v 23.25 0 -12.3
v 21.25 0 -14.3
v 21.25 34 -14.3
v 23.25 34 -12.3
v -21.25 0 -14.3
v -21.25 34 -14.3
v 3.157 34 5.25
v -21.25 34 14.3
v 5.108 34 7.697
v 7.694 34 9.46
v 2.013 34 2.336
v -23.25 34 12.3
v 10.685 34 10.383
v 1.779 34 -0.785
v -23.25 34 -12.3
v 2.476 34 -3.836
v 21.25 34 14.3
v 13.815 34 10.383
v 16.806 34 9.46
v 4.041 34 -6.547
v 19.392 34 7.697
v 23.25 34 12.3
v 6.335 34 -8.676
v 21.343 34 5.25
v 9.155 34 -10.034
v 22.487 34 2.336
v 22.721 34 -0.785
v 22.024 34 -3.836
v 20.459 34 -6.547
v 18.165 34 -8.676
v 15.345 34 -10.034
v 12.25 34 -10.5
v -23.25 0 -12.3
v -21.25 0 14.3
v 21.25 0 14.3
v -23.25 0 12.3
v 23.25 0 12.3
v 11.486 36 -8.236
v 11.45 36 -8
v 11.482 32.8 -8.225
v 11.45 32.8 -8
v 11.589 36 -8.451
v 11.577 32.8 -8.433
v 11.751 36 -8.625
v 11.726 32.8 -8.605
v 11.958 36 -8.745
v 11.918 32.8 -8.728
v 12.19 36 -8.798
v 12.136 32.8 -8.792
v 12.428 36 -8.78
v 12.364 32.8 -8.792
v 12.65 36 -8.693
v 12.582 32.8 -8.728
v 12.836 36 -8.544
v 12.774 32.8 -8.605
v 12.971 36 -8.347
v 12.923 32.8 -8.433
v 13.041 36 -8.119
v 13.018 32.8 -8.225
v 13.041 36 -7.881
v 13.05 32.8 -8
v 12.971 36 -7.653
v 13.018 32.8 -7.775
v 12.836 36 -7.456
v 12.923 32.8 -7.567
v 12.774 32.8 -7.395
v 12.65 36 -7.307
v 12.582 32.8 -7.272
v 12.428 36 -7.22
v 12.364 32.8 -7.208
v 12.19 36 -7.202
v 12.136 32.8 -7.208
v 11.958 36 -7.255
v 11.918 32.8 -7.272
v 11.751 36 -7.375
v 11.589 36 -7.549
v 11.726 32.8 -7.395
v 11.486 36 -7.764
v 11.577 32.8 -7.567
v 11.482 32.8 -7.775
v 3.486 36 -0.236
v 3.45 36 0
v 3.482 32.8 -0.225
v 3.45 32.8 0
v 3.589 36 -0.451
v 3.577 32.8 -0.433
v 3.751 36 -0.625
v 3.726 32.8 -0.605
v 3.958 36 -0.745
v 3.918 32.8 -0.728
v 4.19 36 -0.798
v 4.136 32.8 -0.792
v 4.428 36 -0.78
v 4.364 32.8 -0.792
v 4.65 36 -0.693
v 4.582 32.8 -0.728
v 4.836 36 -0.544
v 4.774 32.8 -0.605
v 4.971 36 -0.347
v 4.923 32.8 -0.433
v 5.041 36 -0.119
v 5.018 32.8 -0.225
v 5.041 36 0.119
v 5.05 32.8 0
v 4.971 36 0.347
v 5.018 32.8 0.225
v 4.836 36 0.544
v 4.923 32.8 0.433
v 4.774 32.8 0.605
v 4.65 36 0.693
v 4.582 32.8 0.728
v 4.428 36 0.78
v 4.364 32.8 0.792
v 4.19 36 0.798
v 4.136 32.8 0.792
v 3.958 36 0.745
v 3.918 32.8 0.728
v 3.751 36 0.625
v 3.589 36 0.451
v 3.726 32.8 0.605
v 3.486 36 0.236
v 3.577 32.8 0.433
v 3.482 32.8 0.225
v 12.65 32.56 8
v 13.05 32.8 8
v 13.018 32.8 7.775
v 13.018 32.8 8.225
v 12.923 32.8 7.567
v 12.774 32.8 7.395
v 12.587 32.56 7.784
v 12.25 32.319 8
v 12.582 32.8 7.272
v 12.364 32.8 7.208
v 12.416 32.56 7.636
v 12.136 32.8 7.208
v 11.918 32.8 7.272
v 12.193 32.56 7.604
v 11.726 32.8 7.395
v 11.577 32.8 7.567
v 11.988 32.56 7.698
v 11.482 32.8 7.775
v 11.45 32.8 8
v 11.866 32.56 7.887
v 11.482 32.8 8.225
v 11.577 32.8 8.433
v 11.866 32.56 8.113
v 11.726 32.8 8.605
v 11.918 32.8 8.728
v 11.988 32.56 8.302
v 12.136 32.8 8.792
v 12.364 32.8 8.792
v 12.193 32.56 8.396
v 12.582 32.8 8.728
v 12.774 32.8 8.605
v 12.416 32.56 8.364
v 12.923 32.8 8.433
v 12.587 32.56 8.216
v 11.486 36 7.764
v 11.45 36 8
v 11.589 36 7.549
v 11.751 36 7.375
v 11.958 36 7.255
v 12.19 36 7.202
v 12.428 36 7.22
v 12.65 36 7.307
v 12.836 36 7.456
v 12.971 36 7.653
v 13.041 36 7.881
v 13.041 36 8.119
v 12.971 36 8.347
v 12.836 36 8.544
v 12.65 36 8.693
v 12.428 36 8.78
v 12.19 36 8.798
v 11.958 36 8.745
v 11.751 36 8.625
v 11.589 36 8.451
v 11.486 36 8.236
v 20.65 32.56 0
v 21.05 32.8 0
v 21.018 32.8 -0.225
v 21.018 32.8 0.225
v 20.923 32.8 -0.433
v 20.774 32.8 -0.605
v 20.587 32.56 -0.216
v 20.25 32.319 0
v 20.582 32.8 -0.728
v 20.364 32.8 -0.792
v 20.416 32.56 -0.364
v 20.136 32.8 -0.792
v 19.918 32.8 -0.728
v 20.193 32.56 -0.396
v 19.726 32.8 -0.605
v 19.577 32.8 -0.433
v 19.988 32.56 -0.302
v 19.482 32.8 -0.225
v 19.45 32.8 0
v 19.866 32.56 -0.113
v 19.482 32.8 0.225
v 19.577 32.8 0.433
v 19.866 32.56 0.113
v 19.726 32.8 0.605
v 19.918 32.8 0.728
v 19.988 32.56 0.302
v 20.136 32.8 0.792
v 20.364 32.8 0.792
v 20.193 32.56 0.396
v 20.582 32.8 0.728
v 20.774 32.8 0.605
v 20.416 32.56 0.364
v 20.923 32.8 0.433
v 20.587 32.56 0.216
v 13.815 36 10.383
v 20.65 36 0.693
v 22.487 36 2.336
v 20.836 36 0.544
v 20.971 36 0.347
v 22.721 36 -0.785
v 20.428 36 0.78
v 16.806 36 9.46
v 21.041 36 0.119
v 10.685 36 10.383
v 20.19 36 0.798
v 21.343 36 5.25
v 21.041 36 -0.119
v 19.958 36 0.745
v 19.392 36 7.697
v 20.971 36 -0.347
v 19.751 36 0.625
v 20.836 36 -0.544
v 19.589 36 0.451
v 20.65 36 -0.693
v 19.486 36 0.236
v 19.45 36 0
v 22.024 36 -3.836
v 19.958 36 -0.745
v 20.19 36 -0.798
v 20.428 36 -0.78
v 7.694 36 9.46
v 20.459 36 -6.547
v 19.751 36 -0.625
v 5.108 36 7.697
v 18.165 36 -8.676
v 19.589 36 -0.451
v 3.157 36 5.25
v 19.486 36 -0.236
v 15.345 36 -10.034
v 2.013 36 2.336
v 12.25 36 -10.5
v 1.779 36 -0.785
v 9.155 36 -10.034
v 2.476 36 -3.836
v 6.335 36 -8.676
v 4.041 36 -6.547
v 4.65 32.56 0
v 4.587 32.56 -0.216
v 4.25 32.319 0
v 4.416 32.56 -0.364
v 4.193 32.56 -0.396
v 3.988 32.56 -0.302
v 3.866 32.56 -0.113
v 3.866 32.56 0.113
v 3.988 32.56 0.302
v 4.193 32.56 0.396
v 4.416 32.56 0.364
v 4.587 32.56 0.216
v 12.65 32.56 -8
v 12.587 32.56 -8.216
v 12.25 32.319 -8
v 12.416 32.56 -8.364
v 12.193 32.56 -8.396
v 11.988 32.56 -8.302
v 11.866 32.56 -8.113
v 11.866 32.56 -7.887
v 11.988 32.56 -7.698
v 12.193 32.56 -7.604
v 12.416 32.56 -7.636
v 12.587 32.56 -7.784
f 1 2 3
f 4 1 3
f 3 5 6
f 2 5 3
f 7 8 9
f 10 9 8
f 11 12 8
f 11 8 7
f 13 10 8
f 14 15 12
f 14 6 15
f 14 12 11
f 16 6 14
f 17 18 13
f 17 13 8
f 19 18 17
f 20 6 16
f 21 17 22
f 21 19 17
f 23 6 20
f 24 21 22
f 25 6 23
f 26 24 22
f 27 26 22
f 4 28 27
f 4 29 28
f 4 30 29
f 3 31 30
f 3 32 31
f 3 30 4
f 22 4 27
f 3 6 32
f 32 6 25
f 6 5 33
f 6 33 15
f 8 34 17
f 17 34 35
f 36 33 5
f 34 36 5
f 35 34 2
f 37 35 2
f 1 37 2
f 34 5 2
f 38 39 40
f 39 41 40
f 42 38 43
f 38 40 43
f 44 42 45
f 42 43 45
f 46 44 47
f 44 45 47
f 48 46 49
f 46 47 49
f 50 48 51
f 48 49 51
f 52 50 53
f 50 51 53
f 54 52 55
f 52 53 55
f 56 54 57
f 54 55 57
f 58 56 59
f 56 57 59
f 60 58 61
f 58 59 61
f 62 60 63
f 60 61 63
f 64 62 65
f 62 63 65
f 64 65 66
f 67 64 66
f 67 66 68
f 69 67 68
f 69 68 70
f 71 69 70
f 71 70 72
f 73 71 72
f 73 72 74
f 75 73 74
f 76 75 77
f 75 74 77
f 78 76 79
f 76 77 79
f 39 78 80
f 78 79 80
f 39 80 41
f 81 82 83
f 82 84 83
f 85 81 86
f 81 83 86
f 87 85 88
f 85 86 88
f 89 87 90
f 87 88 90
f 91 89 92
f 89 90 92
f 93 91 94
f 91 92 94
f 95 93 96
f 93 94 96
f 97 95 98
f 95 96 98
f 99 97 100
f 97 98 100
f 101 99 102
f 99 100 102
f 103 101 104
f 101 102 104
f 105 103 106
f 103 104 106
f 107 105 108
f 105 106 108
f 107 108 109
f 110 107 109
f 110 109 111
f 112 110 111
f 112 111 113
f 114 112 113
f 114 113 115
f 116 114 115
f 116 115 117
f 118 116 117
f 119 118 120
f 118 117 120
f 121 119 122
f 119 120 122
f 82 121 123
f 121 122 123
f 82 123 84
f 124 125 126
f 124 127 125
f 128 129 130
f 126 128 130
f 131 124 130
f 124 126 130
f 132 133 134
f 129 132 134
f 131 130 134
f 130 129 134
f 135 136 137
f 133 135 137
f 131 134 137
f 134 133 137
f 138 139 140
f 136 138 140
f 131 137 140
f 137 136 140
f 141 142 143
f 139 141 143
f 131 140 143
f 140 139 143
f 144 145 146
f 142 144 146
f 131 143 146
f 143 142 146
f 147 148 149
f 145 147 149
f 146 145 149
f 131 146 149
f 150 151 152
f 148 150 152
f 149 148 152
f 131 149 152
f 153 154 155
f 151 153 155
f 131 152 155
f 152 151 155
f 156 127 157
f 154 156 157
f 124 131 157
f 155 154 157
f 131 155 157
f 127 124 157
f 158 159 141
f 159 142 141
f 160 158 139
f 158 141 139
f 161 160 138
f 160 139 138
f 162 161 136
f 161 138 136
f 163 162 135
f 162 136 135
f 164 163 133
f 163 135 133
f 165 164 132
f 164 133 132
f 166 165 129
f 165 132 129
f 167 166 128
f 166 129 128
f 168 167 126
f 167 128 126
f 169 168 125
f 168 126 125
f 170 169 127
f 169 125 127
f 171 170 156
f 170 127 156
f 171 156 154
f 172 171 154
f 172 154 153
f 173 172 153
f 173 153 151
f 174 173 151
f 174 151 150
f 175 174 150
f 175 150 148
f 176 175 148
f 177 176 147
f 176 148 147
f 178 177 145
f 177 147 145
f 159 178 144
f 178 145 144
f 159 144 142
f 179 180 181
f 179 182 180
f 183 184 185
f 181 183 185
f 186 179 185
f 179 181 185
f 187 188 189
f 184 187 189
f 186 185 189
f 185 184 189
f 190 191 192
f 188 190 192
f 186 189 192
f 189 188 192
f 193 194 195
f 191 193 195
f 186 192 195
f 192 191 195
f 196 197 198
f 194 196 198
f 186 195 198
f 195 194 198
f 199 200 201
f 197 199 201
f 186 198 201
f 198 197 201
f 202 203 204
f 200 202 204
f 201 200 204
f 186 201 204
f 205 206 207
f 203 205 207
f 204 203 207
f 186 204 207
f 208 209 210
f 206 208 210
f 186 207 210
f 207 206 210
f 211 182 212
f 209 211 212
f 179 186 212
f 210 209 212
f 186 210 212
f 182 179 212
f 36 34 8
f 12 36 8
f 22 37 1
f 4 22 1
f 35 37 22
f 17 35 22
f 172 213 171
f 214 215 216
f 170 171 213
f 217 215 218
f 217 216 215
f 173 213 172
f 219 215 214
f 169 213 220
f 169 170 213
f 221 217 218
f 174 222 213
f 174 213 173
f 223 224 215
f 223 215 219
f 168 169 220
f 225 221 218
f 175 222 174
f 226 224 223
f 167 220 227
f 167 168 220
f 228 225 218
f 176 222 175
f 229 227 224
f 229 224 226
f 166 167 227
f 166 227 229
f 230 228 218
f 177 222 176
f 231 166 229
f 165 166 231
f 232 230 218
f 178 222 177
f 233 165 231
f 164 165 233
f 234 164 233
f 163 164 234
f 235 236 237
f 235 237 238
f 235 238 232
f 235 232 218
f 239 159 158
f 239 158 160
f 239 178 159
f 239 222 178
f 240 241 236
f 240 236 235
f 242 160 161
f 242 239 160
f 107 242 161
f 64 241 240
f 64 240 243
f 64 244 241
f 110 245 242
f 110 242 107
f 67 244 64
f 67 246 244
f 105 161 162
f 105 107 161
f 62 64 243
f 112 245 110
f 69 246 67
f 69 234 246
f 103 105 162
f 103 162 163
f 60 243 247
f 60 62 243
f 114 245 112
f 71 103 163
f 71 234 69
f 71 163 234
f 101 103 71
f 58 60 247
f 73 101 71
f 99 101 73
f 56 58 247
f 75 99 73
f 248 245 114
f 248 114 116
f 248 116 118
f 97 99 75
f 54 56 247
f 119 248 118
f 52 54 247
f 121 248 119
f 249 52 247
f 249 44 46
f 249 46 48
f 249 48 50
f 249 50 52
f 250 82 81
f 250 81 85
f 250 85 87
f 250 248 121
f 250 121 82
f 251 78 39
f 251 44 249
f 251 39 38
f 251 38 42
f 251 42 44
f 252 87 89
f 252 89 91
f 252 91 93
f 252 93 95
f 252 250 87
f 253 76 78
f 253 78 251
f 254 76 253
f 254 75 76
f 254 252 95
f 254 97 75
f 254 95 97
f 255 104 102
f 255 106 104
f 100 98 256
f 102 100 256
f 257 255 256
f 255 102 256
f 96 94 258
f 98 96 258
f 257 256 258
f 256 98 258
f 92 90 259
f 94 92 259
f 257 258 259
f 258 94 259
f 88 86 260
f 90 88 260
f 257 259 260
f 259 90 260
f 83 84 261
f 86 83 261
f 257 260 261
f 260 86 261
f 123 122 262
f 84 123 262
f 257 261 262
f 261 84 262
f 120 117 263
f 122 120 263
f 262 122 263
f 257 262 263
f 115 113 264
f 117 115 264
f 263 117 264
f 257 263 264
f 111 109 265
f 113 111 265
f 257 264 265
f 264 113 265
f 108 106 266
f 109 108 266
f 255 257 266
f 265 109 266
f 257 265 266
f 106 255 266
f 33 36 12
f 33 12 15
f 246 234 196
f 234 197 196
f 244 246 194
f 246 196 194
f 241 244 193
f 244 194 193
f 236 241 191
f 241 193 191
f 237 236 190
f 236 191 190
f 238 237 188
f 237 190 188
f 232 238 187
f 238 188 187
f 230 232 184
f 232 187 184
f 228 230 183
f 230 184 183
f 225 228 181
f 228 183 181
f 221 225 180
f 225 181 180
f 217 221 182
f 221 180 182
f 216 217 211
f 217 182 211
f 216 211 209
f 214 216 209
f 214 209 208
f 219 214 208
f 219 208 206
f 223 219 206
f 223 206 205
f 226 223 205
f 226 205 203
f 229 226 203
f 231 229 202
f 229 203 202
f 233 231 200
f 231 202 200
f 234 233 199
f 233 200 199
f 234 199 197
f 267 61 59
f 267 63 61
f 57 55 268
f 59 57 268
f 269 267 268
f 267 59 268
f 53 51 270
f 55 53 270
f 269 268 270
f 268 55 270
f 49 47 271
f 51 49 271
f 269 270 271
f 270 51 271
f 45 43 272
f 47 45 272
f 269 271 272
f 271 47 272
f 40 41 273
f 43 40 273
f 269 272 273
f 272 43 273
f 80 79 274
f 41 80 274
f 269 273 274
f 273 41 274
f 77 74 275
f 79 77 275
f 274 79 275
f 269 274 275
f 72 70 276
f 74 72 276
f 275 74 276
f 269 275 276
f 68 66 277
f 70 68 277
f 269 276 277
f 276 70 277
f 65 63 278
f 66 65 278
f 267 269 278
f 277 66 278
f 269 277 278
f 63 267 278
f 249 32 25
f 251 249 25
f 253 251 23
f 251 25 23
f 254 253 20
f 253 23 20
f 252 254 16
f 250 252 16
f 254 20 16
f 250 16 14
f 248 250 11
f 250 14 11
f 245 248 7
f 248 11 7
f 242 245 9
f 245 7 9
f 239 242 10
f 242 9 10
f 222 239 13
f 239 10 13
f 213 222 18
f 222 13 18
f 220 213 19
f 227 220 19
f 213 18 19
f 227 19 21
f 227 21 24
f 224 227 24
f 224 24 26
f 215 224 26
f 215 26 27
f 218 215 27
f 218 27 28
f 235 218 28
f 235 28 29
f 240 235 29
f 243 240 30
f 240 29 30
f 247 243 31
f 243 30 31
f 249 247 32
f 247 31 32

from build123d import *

# Parameters (mm, degrees)
ESQUISSE1_W               = 46.5
ESQUISSE1_H               = 28.6
BOSS_EXTRU_1_DEPTH        = 34
CHANFREIN1_SIZE           = 2
ESQUISSE2_R               = 10.5
BOSS_EXTRU_2_DEPTH        = 2
TROU_TARAUD_M2X0_41_D     = 1.6
TROU_TARAUD_M2X0_41_DEPTH = 3.2
TROU_TARAUD_M2X0_41_TIP   = 0.480688495


with BuildPart() as part:
    # Esquisse1 → Boss.-Extru.1 (new body)
    with BuildSketch(Plane(origin=(0, 0, 0), x_dir=(1, 0, 0), z_dir=(0, 1, 0))):
        Rectangle(ESQUISSE1_W, ESQUISSE1_H)
    extrude(amount=BOSS_EXTRU_1_DEPTH)

    # Chanfrein1
    chanfrein1_edges = [part.edges().sort_by_distance(p)[0] for p in [
        (23.25, 17, 14.3),
        (-23.25, 17, 14.3),
        (-23.25, 17, -14.3),
        (23.25, 17, -14.3),
    ]]
    chamfer(chanfrein1_edges, length=CHANFREIN1_SIZE)

    # Esquisse2 → Boss.-Extru.2 (add)
    with BuildSketch(Plane(origin=(0, 34, 0), x_dir=(1, 0, 0), z_dir=(0, 1, 0))):
        with Locations(Location((12.25, 0, 0), (0, 0, 90))):
            Circle(ESQUISSE2_R)
    extrude(amount=BOSS_EXTRU_2_DEPTH)

    # Trou taraudé M2x0.41
    with Locations(Plane(origin=(0, 36, 0), x_dir=(1, 0, 0), z_dir=(0, 1, 0))):
        with Locations((12.25, 8), (20.25, 0), (12.25, -8), (4.25, 0)):
            Hole(TROU_TARAUD_M2X0_41_D / 2, depth=TROU_TARAUD_M2X0_41_DEPTH)
            with Locations((0, 0, -(TROU_TARAUD_M2X0_41_DEPTH + TROU_TARAUD_M2X0_41_TIP / 2))):  # 118° drill point
                Cone(0, TROU_TARAUD_M2X0_41_D / 2, TROU_TARAUD_M2X0_41_TIP, mode=Mode.SUBTRACT)


solid = part.part
